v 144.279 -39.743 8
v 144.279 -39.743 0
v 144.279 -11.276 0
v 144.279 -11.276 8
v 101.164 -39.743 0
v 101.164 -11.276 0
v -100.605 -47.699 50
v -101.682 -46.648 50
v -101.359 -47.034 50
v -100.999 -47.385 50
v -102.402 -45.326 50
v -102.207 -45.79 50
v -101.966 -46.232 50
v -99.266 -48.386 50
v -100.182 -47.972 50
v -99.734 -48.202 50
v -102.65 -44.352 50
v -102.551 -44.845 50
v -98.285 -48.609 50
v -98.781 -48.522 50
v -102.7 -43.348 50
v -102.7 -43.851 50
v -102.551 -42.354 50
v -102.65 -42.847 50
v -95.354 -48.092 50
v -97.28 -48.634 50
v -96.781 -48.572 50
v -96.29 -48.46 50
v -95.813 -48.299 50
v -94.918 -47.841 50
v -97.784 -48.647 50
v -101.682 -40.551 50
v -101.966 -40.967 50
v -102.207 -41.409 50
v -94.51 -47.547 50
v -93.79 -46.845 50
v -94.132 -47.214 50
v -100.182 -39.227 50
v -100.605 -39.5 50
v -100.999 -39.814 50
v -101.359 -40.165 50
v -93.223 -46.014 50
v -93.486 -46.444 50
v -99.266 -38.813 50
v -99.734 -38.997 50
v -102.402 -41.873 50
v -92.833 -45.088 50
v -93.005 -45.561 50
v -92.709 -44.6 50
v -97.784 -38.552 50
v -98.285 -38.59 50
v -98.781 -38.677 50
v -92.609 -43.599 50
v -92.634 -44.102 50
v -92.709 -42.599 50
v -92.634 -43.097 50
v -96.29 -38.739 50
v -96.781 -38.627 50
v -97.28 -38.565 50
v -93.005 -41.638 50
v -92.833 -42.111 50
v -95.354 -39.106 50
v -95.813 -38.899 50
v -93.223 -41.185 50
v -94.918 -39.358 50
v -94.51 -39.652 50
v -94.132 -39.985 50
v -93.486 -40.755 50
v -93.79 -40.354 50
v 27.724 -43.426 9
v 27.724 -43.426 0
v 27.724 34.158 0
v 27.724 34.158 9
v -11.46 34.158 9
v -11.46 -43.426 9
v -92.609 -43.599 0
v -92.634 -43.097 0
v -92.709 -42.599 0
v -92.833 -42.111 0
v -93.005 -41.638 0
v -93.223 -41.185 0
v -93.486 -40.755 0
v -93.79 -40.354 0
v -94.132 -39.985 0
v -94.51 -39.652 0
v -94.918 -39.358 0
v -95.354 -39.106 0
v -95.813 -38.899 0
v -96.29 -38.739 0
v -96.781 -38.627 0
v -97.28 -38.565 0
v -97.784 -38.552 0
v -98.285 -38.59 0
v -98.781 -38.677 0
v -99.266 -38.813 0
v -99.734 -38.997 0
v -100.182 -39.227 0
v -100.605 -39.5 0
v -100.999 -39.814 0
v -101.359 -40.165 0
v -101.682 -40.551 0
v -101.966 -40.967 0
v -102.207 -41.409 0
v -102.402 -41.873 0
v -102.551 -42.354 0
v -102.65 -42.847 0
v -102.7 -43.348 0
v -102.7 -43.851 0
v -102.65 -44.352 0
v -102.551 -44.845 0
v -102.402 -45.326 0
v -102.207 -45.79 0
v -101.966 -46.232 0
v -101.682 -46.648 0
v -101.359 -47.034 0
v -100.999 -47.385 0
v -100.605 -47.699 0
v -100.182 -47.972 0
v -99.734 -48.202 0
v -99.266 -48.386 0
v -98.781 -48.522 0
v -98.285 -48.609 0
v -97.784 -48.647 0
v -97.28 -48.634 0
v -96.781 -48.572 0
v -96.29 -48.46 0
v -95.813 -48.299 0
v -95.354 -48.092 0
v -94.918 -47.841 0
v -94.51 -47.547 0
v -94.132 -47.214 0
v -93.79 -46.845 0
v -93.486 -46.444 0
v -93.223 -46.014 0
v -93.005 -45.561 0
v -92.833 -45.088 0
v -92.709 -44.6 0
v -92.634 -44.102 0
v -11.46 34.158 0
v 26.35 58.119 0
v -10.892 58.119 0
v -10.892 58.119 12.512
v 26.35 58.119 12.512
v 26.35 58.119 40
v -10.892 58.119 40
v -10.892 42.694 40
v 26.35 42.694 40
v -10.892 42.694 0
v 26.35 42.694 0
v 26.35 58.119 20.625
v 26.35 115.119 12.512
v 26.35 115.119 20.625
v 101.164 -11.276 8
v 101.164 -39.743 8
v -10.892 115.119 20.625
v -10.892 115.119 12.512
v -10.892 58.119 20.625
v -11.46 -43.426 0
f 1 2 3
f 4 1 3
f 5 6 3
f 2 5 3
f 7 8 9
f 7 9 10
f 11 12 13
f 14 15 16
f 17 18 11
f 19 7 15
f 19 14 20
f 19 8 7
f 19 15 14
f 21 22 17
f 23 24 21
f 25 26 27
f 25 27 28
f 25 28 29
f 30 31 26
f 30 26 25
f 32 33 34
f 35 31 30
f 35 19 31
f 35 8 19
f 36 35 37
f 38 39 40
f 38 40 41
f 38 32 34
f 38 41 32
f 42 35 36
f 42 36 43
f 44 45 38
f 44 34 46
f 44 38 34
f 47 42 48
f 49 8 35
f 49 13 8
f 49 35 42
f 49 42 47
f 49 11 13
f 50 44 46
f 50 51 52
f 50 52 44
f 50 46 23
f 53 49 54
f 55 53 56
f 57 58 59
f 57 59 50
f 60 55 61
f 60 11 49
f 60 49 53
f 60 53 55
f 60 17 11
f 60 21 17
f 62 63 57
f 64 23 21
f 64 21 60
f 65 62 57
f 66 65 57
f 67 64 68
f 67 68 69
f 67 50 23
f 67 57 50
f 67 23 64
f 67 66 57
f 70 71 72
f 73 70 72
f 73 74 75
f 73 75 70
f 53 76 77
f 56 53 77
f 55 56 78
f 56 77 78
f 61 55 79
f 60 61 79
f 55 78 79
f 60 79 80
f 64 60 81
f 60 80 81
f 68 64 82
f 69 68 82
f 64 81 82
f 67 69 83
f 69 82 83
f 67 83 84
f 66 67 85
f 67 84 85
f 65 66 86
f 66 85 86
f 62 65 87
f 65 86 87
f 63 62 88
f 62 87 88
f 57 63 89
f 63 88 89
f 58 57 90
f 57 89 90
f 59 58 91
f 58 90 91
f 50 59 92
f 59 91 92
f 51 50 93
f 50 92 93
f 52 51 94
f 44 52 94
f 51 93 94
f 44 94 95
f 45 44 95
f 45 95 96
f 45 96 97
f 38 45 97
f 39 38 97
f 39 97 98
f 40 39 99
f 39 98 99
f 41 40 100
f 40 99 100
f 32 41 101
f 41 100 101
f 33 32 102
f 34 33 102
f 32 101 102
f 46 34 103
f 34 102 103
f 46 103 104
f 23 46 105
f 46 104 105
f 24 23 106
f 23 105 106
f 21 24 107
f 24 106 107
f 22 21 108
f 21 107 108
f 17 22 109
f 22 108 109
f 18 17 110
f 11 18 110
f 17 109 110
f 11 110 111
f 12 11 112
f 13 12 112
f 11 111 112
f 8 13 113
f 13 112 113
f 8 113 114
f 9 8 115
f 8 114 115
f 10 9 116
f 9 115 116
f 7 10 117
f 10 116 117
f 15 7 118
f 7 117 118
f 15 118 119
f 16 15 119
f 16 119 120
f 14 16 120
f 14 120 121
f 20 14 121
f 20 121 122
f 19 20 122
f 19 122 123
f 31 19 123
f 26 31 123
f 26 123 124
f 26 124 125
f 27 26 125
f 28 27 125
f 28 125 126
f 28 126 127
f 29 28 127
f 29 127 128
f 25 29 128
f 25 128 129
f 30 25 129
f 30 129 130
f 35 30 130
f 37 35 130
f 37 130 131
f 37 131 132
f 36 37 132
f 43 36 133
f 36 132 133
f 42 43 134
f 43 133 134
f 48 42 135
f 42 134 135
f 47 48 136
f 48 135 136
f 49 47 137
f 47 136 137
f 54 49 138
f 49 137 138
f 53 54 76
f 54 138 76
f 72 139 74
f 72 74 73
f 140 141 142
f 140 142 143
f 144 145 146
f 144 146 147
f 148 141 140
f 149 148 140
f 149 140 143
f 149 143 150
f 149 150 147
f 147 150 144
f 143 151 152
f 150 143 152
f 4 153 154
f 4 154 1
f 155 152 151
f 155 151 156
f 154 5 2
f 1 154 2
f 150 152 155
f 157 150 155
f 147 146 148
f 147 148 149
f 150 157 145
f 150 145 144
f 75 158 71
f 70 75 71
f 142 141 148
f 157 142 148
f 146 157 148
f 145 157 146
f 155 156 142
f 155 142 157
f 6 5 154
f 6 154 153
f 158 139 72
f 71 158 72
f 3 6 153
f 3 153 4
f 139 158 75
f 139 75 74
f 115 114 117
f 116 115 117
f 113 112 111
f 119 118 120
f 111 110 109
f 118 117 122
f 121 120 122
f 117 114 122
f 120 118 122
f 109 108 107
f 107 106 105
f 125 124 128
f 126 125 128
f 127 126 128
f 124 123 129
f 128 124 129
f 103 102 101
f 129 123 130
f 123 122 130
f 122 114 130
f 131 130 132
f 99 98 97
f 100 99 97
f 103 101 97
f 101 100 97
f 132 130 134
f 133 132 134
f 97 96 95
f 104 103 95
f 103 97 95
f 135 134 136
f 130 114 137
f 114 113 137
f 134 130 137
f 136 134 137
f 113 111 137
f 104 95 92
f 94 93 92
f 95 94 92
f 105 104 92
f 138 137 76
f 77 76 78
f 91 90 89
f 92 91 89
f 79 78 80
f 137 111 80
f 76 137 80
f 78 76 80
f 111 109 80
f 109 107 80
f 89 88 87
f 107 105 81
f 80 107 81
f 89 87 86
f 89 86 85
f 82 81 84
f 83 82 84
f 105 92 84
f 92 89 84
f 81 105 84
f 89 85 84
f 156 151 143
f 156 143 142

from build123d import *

# Parameters (mm, degrees)
F2_W      = 39.1845554113
F2_H      = 77.5835588574
F3_DEPTH  = 9
F4_W      = 37.2421750799
F4_H      = 15.4253318906
F5_DEPTH  = 40
F6_W      = 37.2421750799
F6_H      = 8.1134717911
F7_DEPTH  = 16
F8_DEPTH  = 25
F9_DEPTH  = 15
F10_DEPTH = 1
F11_DEPTH = 20
F12_R     = 5.0490195459
F13_DEPTH = 50
F14_W     = 43.1157648563
F14_H     = 28.46735809
F15_DEPTH = 8


# Not quite as in the source:
# - the program builds the solid bodies; features that only make, move or delete a surface that nothing else refers to are left out


with BuildPart() as f3:
    # F2 (on Top) → F3 (new body)
    with BuildSketch(Plane.XY):
        with Locations((8.1322155893, -4.6339258552)):
            Rectangle(F2_W, F2_H)
    extrude(amount=F3_DEPTH)


with BuildPart() as f5:
    # F4 (on Top) → F5 (new body)
    with BuildSketch(Plane.XY):
        with Locations((7.7287382446, 50.4066199064)):
            Rectangle(F4_W, F4_H)
    extrude(amount=F5_DEPTH)

    # F6 (on face) → F7 (join)
    with BuildSketch(Plane(origin=(0, 58.1192858517, 0), x_dir=(-1, 0, 0), z_dir=(0, 1, 0))):
        with Locations((-7.7287382446, 16.5685703978)):
            Rectangle(F6_W, F6_H)
    extrude(amount=F7_DEPTH)

    # F8 (add): a face of the model
    f8_faces = [f5.faces().sort_by_distance(p)[0] for p in [
        (7.7287382446, 74.1192858517, 16.5685703978),
    ]]
    extrude(f8_faces, amount=F8_DEPTH)

    # F9 (add): a face of the model
    f9_faces = [f5.faces().sort_by_distance(p)[0] for p in [
        (7.7287382446, 99.1192858517, 16.5685703978),
    ]]
    extrude(f9_faces, amount=F9_DEPTH)

    # F10 (add): a face of the model
    f10_faces = [f5.faces().sort_by_distance(p)[0] for p in [
        (7.7287382446, 114.1192858517, 16.5685703978),
    ]]
    extrude(f10_faces, amount=F10_DEPTH)

    # F11 (add): a face of the model
    f11_faces = [f5.faces().sort_by_distance(p)[0] for p in [
        (7.7287382446, 115.1192858517, 16.5685703978),
    ]]
    extrude(f11_faces, amount=-F11_DEPTH)


with BuildPart() as f13:
    # F12 (on Top) → F13 (new body)
    with BuildSketch(Plane.XY):
        with Locations((-97.6576507092, -43.5994267464)):
            Circle(F12_R)
    extrude(amount=F13_DEPTH)


with BuildPart() as f15:
    # F14 (on Top) → F15 (new body)
    with BuildSketch(Plane.XY):
        with Locations((122.7215528488, -25.5093905143)):
            Rectangle(F14_W, F14_H)
    extrude(amount=F15_DEPTH)


solid = Compound([f3.part, f5.part, f13.part, f15.part])
